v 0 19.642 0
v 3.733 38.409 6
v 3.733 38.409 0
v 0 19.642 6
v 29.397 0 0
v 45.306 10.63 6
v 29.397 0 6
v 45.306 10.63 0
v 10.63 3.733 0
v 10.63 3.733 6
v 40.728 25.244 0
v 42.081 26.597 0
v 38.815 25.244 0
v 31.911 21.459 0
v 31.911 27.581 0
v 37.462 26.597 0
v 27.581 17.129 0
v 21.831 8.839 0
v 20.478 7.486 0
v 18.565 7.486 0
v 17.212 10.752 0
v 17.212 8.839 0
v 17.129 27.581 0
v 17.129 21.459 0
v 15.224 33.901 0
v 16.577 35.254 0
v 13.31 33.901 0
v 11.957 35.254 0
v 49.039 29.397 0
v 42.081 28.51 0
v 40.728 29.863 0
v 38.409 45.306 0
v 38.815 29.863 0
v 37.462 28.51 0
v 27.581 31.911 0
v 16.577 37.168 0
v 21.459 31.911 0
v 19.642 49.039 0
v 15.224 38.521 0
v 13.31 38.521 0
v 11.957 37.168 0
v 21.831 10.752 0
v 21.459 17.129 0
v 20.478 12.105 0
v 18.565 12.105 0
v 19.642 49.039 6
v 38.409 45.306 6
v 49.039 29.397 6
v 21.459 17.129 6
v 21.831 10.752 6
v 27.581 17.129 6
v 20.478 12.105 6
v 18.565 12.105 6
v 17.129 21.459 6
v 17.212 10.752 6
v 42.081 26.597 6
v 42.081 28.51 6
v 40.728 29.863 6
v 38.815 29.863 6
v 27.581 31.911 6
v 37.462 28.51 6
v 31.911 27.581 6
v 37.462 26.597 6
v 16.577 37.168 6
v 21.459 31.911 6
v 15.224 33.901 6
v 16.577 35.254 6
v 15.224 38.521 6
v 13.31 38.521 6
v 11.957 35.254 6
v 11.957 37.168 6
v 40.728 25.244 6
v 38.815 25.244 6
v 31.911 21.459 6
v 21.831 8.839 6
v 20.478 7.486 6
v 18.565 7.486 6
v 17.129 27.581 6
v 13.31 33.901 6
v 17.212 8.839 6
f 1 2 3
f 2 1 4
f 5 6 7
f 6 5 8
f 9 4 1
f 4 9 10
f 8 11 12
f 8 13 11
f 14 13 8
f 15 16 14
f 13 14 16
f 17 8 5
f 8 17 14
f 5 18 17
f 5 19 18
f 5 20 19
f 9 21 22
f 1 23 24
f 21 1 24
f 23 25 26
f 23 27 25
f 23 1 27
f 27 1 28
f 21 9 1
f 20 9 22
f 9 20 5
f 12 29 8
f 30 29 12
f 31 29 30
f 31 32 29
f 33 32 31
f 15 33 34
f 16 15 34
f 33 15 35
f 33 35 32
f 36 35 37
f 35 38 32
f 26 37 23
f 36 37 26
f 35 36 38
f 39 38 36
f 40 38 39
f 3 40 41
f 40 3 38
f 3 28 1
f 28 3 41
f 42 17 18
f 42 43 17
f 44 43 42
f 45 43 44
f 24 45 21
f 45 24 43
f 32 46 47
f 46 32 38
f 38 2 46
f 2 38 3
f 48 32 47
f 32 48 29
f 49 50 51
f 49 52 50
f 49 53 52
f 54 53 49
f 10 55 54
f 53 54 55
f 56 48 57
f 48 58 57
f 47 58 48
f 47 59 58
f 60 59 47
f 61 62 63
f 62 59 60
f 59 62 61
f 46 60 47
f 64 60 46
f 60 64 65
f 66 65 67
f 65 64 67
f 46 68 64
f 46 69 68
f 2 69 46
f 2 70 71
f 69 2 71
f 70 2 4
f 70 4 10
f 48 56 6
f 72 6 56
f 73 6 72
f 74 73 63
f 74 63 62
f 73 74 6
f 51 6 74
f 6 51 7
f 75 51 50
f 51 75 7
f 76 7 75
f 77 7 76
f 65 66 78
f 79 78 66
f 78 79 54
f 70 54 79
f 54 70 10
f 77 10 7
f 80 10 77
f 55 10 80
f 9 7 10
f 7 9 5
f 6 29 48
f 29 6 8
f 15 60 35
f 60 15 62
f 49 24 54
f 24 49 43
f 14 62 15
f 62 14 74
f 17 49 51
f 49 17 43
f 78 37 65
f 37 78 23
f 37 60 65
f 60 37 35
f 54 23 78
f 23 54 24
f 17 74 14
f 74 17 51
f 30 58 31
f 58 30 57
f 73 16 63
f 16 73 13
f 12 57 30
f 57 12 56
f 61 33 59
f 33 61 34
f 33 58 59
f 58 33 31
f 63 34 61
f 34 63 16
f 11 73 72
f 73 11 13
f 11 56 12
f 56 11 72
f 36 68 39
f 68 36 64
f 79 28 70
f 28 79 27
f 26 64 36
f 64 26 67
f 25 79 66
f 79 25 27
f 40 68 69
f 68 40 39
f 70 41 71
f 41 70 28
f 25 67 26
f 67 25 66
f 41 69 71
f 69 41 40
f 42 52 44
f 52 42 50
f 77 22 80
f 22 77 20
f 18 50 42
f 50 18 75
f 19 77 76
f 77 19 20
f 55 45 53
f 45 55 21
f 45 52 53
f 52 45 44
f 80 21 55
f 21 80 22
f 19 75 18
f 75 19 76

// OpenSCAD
$fn = 32;

// ----------------------------------------------------------------------
// Polygon plate: 8-gon R25, 3 bolt windows
// ----------------------------------------------------------------------

// --- parameters (mm) ---
sides = 8;                // number of polygon sides
plate_r = 25;             // circumscribed radius of the polygon
bore_r = 8;               // centre bore radius
bolts = 3;                // number of bolt windows
ring_r = 15.55;           // bolt-circle radius
bolt_r = 2.5;             // bolt window radius
plate_t = 6;              // plate thickness, Z (extrusion height)

plate_d = 2 * plate_r;  // circumscribed diameter
bore_d = 2 * bore_r;  // centre bore diameter
bolt_d = 2 * bolt_r;  // bolt window diameter
ring_d = 2 * ring_r;  // bolt-circle diameter

profile = [[49.039, 29.397], [38.409, 45.306], [19.642, 49.039], [3.733, 38.409], [0, 19.642], [10.63, 3.733], [29.397, 0], [45.306, 10.63]];  // primary outline, 8 points, counter clockwise
void_1 = [[31.911, 27.581], [27.581, 31.911], [21.459, 31.911], [17.129, 27.581], [17.129, 21.459], [21.459, 17.129], [27.581, 17.129], [31.911, 21.459]];  // centre bore, 8 points
void_2 = [[42.081, 28.51], [40.728, 29.863], [38.815, 29.863], [37.462, 28.51], [37.462, 26.597], [38.815, 25.244], [40.728, 25.244], [42.081, 26.597]];  // bolt window 1, 8 points
void_3 = [[16.577, 37.168], [15.224, 38.521], [13.31, 38.521], [11.957, 37.168], [11.957, 35.254], [13.31, 33.901], [15.224, 33.901], [16.577, 35.254]];  // bolt window 2, 8 points
void_4 = [[21.831, 10.752], [20.478, 12.105], [18.565, 12.105], [17.212, 10.752], [17.212, 8.839], [18.565, 7.486], [20.478, 7.486], [21.831, 8.839]];  // bolt window 3, 8 points

// --- the one profile operation ---
difference() {
  linear_extrude(height = plate_t) polygon(points = profile);
  translate([0, 0, -1])
    linear_extrude(height = plate_t + 2) polygon(points = void_1);
  translate([0, 0, -1])
    linear_extrude(height = plate_t + 2) polygon(points = void_2);
  translate([0, 0, -1])
    linear_extrude(height = plate_t + 2) polygon(points = void_3);
  translate([0, 0, -1])
    linear_extrude(height = plate_t + 2) polygon(points = void_4);
}
